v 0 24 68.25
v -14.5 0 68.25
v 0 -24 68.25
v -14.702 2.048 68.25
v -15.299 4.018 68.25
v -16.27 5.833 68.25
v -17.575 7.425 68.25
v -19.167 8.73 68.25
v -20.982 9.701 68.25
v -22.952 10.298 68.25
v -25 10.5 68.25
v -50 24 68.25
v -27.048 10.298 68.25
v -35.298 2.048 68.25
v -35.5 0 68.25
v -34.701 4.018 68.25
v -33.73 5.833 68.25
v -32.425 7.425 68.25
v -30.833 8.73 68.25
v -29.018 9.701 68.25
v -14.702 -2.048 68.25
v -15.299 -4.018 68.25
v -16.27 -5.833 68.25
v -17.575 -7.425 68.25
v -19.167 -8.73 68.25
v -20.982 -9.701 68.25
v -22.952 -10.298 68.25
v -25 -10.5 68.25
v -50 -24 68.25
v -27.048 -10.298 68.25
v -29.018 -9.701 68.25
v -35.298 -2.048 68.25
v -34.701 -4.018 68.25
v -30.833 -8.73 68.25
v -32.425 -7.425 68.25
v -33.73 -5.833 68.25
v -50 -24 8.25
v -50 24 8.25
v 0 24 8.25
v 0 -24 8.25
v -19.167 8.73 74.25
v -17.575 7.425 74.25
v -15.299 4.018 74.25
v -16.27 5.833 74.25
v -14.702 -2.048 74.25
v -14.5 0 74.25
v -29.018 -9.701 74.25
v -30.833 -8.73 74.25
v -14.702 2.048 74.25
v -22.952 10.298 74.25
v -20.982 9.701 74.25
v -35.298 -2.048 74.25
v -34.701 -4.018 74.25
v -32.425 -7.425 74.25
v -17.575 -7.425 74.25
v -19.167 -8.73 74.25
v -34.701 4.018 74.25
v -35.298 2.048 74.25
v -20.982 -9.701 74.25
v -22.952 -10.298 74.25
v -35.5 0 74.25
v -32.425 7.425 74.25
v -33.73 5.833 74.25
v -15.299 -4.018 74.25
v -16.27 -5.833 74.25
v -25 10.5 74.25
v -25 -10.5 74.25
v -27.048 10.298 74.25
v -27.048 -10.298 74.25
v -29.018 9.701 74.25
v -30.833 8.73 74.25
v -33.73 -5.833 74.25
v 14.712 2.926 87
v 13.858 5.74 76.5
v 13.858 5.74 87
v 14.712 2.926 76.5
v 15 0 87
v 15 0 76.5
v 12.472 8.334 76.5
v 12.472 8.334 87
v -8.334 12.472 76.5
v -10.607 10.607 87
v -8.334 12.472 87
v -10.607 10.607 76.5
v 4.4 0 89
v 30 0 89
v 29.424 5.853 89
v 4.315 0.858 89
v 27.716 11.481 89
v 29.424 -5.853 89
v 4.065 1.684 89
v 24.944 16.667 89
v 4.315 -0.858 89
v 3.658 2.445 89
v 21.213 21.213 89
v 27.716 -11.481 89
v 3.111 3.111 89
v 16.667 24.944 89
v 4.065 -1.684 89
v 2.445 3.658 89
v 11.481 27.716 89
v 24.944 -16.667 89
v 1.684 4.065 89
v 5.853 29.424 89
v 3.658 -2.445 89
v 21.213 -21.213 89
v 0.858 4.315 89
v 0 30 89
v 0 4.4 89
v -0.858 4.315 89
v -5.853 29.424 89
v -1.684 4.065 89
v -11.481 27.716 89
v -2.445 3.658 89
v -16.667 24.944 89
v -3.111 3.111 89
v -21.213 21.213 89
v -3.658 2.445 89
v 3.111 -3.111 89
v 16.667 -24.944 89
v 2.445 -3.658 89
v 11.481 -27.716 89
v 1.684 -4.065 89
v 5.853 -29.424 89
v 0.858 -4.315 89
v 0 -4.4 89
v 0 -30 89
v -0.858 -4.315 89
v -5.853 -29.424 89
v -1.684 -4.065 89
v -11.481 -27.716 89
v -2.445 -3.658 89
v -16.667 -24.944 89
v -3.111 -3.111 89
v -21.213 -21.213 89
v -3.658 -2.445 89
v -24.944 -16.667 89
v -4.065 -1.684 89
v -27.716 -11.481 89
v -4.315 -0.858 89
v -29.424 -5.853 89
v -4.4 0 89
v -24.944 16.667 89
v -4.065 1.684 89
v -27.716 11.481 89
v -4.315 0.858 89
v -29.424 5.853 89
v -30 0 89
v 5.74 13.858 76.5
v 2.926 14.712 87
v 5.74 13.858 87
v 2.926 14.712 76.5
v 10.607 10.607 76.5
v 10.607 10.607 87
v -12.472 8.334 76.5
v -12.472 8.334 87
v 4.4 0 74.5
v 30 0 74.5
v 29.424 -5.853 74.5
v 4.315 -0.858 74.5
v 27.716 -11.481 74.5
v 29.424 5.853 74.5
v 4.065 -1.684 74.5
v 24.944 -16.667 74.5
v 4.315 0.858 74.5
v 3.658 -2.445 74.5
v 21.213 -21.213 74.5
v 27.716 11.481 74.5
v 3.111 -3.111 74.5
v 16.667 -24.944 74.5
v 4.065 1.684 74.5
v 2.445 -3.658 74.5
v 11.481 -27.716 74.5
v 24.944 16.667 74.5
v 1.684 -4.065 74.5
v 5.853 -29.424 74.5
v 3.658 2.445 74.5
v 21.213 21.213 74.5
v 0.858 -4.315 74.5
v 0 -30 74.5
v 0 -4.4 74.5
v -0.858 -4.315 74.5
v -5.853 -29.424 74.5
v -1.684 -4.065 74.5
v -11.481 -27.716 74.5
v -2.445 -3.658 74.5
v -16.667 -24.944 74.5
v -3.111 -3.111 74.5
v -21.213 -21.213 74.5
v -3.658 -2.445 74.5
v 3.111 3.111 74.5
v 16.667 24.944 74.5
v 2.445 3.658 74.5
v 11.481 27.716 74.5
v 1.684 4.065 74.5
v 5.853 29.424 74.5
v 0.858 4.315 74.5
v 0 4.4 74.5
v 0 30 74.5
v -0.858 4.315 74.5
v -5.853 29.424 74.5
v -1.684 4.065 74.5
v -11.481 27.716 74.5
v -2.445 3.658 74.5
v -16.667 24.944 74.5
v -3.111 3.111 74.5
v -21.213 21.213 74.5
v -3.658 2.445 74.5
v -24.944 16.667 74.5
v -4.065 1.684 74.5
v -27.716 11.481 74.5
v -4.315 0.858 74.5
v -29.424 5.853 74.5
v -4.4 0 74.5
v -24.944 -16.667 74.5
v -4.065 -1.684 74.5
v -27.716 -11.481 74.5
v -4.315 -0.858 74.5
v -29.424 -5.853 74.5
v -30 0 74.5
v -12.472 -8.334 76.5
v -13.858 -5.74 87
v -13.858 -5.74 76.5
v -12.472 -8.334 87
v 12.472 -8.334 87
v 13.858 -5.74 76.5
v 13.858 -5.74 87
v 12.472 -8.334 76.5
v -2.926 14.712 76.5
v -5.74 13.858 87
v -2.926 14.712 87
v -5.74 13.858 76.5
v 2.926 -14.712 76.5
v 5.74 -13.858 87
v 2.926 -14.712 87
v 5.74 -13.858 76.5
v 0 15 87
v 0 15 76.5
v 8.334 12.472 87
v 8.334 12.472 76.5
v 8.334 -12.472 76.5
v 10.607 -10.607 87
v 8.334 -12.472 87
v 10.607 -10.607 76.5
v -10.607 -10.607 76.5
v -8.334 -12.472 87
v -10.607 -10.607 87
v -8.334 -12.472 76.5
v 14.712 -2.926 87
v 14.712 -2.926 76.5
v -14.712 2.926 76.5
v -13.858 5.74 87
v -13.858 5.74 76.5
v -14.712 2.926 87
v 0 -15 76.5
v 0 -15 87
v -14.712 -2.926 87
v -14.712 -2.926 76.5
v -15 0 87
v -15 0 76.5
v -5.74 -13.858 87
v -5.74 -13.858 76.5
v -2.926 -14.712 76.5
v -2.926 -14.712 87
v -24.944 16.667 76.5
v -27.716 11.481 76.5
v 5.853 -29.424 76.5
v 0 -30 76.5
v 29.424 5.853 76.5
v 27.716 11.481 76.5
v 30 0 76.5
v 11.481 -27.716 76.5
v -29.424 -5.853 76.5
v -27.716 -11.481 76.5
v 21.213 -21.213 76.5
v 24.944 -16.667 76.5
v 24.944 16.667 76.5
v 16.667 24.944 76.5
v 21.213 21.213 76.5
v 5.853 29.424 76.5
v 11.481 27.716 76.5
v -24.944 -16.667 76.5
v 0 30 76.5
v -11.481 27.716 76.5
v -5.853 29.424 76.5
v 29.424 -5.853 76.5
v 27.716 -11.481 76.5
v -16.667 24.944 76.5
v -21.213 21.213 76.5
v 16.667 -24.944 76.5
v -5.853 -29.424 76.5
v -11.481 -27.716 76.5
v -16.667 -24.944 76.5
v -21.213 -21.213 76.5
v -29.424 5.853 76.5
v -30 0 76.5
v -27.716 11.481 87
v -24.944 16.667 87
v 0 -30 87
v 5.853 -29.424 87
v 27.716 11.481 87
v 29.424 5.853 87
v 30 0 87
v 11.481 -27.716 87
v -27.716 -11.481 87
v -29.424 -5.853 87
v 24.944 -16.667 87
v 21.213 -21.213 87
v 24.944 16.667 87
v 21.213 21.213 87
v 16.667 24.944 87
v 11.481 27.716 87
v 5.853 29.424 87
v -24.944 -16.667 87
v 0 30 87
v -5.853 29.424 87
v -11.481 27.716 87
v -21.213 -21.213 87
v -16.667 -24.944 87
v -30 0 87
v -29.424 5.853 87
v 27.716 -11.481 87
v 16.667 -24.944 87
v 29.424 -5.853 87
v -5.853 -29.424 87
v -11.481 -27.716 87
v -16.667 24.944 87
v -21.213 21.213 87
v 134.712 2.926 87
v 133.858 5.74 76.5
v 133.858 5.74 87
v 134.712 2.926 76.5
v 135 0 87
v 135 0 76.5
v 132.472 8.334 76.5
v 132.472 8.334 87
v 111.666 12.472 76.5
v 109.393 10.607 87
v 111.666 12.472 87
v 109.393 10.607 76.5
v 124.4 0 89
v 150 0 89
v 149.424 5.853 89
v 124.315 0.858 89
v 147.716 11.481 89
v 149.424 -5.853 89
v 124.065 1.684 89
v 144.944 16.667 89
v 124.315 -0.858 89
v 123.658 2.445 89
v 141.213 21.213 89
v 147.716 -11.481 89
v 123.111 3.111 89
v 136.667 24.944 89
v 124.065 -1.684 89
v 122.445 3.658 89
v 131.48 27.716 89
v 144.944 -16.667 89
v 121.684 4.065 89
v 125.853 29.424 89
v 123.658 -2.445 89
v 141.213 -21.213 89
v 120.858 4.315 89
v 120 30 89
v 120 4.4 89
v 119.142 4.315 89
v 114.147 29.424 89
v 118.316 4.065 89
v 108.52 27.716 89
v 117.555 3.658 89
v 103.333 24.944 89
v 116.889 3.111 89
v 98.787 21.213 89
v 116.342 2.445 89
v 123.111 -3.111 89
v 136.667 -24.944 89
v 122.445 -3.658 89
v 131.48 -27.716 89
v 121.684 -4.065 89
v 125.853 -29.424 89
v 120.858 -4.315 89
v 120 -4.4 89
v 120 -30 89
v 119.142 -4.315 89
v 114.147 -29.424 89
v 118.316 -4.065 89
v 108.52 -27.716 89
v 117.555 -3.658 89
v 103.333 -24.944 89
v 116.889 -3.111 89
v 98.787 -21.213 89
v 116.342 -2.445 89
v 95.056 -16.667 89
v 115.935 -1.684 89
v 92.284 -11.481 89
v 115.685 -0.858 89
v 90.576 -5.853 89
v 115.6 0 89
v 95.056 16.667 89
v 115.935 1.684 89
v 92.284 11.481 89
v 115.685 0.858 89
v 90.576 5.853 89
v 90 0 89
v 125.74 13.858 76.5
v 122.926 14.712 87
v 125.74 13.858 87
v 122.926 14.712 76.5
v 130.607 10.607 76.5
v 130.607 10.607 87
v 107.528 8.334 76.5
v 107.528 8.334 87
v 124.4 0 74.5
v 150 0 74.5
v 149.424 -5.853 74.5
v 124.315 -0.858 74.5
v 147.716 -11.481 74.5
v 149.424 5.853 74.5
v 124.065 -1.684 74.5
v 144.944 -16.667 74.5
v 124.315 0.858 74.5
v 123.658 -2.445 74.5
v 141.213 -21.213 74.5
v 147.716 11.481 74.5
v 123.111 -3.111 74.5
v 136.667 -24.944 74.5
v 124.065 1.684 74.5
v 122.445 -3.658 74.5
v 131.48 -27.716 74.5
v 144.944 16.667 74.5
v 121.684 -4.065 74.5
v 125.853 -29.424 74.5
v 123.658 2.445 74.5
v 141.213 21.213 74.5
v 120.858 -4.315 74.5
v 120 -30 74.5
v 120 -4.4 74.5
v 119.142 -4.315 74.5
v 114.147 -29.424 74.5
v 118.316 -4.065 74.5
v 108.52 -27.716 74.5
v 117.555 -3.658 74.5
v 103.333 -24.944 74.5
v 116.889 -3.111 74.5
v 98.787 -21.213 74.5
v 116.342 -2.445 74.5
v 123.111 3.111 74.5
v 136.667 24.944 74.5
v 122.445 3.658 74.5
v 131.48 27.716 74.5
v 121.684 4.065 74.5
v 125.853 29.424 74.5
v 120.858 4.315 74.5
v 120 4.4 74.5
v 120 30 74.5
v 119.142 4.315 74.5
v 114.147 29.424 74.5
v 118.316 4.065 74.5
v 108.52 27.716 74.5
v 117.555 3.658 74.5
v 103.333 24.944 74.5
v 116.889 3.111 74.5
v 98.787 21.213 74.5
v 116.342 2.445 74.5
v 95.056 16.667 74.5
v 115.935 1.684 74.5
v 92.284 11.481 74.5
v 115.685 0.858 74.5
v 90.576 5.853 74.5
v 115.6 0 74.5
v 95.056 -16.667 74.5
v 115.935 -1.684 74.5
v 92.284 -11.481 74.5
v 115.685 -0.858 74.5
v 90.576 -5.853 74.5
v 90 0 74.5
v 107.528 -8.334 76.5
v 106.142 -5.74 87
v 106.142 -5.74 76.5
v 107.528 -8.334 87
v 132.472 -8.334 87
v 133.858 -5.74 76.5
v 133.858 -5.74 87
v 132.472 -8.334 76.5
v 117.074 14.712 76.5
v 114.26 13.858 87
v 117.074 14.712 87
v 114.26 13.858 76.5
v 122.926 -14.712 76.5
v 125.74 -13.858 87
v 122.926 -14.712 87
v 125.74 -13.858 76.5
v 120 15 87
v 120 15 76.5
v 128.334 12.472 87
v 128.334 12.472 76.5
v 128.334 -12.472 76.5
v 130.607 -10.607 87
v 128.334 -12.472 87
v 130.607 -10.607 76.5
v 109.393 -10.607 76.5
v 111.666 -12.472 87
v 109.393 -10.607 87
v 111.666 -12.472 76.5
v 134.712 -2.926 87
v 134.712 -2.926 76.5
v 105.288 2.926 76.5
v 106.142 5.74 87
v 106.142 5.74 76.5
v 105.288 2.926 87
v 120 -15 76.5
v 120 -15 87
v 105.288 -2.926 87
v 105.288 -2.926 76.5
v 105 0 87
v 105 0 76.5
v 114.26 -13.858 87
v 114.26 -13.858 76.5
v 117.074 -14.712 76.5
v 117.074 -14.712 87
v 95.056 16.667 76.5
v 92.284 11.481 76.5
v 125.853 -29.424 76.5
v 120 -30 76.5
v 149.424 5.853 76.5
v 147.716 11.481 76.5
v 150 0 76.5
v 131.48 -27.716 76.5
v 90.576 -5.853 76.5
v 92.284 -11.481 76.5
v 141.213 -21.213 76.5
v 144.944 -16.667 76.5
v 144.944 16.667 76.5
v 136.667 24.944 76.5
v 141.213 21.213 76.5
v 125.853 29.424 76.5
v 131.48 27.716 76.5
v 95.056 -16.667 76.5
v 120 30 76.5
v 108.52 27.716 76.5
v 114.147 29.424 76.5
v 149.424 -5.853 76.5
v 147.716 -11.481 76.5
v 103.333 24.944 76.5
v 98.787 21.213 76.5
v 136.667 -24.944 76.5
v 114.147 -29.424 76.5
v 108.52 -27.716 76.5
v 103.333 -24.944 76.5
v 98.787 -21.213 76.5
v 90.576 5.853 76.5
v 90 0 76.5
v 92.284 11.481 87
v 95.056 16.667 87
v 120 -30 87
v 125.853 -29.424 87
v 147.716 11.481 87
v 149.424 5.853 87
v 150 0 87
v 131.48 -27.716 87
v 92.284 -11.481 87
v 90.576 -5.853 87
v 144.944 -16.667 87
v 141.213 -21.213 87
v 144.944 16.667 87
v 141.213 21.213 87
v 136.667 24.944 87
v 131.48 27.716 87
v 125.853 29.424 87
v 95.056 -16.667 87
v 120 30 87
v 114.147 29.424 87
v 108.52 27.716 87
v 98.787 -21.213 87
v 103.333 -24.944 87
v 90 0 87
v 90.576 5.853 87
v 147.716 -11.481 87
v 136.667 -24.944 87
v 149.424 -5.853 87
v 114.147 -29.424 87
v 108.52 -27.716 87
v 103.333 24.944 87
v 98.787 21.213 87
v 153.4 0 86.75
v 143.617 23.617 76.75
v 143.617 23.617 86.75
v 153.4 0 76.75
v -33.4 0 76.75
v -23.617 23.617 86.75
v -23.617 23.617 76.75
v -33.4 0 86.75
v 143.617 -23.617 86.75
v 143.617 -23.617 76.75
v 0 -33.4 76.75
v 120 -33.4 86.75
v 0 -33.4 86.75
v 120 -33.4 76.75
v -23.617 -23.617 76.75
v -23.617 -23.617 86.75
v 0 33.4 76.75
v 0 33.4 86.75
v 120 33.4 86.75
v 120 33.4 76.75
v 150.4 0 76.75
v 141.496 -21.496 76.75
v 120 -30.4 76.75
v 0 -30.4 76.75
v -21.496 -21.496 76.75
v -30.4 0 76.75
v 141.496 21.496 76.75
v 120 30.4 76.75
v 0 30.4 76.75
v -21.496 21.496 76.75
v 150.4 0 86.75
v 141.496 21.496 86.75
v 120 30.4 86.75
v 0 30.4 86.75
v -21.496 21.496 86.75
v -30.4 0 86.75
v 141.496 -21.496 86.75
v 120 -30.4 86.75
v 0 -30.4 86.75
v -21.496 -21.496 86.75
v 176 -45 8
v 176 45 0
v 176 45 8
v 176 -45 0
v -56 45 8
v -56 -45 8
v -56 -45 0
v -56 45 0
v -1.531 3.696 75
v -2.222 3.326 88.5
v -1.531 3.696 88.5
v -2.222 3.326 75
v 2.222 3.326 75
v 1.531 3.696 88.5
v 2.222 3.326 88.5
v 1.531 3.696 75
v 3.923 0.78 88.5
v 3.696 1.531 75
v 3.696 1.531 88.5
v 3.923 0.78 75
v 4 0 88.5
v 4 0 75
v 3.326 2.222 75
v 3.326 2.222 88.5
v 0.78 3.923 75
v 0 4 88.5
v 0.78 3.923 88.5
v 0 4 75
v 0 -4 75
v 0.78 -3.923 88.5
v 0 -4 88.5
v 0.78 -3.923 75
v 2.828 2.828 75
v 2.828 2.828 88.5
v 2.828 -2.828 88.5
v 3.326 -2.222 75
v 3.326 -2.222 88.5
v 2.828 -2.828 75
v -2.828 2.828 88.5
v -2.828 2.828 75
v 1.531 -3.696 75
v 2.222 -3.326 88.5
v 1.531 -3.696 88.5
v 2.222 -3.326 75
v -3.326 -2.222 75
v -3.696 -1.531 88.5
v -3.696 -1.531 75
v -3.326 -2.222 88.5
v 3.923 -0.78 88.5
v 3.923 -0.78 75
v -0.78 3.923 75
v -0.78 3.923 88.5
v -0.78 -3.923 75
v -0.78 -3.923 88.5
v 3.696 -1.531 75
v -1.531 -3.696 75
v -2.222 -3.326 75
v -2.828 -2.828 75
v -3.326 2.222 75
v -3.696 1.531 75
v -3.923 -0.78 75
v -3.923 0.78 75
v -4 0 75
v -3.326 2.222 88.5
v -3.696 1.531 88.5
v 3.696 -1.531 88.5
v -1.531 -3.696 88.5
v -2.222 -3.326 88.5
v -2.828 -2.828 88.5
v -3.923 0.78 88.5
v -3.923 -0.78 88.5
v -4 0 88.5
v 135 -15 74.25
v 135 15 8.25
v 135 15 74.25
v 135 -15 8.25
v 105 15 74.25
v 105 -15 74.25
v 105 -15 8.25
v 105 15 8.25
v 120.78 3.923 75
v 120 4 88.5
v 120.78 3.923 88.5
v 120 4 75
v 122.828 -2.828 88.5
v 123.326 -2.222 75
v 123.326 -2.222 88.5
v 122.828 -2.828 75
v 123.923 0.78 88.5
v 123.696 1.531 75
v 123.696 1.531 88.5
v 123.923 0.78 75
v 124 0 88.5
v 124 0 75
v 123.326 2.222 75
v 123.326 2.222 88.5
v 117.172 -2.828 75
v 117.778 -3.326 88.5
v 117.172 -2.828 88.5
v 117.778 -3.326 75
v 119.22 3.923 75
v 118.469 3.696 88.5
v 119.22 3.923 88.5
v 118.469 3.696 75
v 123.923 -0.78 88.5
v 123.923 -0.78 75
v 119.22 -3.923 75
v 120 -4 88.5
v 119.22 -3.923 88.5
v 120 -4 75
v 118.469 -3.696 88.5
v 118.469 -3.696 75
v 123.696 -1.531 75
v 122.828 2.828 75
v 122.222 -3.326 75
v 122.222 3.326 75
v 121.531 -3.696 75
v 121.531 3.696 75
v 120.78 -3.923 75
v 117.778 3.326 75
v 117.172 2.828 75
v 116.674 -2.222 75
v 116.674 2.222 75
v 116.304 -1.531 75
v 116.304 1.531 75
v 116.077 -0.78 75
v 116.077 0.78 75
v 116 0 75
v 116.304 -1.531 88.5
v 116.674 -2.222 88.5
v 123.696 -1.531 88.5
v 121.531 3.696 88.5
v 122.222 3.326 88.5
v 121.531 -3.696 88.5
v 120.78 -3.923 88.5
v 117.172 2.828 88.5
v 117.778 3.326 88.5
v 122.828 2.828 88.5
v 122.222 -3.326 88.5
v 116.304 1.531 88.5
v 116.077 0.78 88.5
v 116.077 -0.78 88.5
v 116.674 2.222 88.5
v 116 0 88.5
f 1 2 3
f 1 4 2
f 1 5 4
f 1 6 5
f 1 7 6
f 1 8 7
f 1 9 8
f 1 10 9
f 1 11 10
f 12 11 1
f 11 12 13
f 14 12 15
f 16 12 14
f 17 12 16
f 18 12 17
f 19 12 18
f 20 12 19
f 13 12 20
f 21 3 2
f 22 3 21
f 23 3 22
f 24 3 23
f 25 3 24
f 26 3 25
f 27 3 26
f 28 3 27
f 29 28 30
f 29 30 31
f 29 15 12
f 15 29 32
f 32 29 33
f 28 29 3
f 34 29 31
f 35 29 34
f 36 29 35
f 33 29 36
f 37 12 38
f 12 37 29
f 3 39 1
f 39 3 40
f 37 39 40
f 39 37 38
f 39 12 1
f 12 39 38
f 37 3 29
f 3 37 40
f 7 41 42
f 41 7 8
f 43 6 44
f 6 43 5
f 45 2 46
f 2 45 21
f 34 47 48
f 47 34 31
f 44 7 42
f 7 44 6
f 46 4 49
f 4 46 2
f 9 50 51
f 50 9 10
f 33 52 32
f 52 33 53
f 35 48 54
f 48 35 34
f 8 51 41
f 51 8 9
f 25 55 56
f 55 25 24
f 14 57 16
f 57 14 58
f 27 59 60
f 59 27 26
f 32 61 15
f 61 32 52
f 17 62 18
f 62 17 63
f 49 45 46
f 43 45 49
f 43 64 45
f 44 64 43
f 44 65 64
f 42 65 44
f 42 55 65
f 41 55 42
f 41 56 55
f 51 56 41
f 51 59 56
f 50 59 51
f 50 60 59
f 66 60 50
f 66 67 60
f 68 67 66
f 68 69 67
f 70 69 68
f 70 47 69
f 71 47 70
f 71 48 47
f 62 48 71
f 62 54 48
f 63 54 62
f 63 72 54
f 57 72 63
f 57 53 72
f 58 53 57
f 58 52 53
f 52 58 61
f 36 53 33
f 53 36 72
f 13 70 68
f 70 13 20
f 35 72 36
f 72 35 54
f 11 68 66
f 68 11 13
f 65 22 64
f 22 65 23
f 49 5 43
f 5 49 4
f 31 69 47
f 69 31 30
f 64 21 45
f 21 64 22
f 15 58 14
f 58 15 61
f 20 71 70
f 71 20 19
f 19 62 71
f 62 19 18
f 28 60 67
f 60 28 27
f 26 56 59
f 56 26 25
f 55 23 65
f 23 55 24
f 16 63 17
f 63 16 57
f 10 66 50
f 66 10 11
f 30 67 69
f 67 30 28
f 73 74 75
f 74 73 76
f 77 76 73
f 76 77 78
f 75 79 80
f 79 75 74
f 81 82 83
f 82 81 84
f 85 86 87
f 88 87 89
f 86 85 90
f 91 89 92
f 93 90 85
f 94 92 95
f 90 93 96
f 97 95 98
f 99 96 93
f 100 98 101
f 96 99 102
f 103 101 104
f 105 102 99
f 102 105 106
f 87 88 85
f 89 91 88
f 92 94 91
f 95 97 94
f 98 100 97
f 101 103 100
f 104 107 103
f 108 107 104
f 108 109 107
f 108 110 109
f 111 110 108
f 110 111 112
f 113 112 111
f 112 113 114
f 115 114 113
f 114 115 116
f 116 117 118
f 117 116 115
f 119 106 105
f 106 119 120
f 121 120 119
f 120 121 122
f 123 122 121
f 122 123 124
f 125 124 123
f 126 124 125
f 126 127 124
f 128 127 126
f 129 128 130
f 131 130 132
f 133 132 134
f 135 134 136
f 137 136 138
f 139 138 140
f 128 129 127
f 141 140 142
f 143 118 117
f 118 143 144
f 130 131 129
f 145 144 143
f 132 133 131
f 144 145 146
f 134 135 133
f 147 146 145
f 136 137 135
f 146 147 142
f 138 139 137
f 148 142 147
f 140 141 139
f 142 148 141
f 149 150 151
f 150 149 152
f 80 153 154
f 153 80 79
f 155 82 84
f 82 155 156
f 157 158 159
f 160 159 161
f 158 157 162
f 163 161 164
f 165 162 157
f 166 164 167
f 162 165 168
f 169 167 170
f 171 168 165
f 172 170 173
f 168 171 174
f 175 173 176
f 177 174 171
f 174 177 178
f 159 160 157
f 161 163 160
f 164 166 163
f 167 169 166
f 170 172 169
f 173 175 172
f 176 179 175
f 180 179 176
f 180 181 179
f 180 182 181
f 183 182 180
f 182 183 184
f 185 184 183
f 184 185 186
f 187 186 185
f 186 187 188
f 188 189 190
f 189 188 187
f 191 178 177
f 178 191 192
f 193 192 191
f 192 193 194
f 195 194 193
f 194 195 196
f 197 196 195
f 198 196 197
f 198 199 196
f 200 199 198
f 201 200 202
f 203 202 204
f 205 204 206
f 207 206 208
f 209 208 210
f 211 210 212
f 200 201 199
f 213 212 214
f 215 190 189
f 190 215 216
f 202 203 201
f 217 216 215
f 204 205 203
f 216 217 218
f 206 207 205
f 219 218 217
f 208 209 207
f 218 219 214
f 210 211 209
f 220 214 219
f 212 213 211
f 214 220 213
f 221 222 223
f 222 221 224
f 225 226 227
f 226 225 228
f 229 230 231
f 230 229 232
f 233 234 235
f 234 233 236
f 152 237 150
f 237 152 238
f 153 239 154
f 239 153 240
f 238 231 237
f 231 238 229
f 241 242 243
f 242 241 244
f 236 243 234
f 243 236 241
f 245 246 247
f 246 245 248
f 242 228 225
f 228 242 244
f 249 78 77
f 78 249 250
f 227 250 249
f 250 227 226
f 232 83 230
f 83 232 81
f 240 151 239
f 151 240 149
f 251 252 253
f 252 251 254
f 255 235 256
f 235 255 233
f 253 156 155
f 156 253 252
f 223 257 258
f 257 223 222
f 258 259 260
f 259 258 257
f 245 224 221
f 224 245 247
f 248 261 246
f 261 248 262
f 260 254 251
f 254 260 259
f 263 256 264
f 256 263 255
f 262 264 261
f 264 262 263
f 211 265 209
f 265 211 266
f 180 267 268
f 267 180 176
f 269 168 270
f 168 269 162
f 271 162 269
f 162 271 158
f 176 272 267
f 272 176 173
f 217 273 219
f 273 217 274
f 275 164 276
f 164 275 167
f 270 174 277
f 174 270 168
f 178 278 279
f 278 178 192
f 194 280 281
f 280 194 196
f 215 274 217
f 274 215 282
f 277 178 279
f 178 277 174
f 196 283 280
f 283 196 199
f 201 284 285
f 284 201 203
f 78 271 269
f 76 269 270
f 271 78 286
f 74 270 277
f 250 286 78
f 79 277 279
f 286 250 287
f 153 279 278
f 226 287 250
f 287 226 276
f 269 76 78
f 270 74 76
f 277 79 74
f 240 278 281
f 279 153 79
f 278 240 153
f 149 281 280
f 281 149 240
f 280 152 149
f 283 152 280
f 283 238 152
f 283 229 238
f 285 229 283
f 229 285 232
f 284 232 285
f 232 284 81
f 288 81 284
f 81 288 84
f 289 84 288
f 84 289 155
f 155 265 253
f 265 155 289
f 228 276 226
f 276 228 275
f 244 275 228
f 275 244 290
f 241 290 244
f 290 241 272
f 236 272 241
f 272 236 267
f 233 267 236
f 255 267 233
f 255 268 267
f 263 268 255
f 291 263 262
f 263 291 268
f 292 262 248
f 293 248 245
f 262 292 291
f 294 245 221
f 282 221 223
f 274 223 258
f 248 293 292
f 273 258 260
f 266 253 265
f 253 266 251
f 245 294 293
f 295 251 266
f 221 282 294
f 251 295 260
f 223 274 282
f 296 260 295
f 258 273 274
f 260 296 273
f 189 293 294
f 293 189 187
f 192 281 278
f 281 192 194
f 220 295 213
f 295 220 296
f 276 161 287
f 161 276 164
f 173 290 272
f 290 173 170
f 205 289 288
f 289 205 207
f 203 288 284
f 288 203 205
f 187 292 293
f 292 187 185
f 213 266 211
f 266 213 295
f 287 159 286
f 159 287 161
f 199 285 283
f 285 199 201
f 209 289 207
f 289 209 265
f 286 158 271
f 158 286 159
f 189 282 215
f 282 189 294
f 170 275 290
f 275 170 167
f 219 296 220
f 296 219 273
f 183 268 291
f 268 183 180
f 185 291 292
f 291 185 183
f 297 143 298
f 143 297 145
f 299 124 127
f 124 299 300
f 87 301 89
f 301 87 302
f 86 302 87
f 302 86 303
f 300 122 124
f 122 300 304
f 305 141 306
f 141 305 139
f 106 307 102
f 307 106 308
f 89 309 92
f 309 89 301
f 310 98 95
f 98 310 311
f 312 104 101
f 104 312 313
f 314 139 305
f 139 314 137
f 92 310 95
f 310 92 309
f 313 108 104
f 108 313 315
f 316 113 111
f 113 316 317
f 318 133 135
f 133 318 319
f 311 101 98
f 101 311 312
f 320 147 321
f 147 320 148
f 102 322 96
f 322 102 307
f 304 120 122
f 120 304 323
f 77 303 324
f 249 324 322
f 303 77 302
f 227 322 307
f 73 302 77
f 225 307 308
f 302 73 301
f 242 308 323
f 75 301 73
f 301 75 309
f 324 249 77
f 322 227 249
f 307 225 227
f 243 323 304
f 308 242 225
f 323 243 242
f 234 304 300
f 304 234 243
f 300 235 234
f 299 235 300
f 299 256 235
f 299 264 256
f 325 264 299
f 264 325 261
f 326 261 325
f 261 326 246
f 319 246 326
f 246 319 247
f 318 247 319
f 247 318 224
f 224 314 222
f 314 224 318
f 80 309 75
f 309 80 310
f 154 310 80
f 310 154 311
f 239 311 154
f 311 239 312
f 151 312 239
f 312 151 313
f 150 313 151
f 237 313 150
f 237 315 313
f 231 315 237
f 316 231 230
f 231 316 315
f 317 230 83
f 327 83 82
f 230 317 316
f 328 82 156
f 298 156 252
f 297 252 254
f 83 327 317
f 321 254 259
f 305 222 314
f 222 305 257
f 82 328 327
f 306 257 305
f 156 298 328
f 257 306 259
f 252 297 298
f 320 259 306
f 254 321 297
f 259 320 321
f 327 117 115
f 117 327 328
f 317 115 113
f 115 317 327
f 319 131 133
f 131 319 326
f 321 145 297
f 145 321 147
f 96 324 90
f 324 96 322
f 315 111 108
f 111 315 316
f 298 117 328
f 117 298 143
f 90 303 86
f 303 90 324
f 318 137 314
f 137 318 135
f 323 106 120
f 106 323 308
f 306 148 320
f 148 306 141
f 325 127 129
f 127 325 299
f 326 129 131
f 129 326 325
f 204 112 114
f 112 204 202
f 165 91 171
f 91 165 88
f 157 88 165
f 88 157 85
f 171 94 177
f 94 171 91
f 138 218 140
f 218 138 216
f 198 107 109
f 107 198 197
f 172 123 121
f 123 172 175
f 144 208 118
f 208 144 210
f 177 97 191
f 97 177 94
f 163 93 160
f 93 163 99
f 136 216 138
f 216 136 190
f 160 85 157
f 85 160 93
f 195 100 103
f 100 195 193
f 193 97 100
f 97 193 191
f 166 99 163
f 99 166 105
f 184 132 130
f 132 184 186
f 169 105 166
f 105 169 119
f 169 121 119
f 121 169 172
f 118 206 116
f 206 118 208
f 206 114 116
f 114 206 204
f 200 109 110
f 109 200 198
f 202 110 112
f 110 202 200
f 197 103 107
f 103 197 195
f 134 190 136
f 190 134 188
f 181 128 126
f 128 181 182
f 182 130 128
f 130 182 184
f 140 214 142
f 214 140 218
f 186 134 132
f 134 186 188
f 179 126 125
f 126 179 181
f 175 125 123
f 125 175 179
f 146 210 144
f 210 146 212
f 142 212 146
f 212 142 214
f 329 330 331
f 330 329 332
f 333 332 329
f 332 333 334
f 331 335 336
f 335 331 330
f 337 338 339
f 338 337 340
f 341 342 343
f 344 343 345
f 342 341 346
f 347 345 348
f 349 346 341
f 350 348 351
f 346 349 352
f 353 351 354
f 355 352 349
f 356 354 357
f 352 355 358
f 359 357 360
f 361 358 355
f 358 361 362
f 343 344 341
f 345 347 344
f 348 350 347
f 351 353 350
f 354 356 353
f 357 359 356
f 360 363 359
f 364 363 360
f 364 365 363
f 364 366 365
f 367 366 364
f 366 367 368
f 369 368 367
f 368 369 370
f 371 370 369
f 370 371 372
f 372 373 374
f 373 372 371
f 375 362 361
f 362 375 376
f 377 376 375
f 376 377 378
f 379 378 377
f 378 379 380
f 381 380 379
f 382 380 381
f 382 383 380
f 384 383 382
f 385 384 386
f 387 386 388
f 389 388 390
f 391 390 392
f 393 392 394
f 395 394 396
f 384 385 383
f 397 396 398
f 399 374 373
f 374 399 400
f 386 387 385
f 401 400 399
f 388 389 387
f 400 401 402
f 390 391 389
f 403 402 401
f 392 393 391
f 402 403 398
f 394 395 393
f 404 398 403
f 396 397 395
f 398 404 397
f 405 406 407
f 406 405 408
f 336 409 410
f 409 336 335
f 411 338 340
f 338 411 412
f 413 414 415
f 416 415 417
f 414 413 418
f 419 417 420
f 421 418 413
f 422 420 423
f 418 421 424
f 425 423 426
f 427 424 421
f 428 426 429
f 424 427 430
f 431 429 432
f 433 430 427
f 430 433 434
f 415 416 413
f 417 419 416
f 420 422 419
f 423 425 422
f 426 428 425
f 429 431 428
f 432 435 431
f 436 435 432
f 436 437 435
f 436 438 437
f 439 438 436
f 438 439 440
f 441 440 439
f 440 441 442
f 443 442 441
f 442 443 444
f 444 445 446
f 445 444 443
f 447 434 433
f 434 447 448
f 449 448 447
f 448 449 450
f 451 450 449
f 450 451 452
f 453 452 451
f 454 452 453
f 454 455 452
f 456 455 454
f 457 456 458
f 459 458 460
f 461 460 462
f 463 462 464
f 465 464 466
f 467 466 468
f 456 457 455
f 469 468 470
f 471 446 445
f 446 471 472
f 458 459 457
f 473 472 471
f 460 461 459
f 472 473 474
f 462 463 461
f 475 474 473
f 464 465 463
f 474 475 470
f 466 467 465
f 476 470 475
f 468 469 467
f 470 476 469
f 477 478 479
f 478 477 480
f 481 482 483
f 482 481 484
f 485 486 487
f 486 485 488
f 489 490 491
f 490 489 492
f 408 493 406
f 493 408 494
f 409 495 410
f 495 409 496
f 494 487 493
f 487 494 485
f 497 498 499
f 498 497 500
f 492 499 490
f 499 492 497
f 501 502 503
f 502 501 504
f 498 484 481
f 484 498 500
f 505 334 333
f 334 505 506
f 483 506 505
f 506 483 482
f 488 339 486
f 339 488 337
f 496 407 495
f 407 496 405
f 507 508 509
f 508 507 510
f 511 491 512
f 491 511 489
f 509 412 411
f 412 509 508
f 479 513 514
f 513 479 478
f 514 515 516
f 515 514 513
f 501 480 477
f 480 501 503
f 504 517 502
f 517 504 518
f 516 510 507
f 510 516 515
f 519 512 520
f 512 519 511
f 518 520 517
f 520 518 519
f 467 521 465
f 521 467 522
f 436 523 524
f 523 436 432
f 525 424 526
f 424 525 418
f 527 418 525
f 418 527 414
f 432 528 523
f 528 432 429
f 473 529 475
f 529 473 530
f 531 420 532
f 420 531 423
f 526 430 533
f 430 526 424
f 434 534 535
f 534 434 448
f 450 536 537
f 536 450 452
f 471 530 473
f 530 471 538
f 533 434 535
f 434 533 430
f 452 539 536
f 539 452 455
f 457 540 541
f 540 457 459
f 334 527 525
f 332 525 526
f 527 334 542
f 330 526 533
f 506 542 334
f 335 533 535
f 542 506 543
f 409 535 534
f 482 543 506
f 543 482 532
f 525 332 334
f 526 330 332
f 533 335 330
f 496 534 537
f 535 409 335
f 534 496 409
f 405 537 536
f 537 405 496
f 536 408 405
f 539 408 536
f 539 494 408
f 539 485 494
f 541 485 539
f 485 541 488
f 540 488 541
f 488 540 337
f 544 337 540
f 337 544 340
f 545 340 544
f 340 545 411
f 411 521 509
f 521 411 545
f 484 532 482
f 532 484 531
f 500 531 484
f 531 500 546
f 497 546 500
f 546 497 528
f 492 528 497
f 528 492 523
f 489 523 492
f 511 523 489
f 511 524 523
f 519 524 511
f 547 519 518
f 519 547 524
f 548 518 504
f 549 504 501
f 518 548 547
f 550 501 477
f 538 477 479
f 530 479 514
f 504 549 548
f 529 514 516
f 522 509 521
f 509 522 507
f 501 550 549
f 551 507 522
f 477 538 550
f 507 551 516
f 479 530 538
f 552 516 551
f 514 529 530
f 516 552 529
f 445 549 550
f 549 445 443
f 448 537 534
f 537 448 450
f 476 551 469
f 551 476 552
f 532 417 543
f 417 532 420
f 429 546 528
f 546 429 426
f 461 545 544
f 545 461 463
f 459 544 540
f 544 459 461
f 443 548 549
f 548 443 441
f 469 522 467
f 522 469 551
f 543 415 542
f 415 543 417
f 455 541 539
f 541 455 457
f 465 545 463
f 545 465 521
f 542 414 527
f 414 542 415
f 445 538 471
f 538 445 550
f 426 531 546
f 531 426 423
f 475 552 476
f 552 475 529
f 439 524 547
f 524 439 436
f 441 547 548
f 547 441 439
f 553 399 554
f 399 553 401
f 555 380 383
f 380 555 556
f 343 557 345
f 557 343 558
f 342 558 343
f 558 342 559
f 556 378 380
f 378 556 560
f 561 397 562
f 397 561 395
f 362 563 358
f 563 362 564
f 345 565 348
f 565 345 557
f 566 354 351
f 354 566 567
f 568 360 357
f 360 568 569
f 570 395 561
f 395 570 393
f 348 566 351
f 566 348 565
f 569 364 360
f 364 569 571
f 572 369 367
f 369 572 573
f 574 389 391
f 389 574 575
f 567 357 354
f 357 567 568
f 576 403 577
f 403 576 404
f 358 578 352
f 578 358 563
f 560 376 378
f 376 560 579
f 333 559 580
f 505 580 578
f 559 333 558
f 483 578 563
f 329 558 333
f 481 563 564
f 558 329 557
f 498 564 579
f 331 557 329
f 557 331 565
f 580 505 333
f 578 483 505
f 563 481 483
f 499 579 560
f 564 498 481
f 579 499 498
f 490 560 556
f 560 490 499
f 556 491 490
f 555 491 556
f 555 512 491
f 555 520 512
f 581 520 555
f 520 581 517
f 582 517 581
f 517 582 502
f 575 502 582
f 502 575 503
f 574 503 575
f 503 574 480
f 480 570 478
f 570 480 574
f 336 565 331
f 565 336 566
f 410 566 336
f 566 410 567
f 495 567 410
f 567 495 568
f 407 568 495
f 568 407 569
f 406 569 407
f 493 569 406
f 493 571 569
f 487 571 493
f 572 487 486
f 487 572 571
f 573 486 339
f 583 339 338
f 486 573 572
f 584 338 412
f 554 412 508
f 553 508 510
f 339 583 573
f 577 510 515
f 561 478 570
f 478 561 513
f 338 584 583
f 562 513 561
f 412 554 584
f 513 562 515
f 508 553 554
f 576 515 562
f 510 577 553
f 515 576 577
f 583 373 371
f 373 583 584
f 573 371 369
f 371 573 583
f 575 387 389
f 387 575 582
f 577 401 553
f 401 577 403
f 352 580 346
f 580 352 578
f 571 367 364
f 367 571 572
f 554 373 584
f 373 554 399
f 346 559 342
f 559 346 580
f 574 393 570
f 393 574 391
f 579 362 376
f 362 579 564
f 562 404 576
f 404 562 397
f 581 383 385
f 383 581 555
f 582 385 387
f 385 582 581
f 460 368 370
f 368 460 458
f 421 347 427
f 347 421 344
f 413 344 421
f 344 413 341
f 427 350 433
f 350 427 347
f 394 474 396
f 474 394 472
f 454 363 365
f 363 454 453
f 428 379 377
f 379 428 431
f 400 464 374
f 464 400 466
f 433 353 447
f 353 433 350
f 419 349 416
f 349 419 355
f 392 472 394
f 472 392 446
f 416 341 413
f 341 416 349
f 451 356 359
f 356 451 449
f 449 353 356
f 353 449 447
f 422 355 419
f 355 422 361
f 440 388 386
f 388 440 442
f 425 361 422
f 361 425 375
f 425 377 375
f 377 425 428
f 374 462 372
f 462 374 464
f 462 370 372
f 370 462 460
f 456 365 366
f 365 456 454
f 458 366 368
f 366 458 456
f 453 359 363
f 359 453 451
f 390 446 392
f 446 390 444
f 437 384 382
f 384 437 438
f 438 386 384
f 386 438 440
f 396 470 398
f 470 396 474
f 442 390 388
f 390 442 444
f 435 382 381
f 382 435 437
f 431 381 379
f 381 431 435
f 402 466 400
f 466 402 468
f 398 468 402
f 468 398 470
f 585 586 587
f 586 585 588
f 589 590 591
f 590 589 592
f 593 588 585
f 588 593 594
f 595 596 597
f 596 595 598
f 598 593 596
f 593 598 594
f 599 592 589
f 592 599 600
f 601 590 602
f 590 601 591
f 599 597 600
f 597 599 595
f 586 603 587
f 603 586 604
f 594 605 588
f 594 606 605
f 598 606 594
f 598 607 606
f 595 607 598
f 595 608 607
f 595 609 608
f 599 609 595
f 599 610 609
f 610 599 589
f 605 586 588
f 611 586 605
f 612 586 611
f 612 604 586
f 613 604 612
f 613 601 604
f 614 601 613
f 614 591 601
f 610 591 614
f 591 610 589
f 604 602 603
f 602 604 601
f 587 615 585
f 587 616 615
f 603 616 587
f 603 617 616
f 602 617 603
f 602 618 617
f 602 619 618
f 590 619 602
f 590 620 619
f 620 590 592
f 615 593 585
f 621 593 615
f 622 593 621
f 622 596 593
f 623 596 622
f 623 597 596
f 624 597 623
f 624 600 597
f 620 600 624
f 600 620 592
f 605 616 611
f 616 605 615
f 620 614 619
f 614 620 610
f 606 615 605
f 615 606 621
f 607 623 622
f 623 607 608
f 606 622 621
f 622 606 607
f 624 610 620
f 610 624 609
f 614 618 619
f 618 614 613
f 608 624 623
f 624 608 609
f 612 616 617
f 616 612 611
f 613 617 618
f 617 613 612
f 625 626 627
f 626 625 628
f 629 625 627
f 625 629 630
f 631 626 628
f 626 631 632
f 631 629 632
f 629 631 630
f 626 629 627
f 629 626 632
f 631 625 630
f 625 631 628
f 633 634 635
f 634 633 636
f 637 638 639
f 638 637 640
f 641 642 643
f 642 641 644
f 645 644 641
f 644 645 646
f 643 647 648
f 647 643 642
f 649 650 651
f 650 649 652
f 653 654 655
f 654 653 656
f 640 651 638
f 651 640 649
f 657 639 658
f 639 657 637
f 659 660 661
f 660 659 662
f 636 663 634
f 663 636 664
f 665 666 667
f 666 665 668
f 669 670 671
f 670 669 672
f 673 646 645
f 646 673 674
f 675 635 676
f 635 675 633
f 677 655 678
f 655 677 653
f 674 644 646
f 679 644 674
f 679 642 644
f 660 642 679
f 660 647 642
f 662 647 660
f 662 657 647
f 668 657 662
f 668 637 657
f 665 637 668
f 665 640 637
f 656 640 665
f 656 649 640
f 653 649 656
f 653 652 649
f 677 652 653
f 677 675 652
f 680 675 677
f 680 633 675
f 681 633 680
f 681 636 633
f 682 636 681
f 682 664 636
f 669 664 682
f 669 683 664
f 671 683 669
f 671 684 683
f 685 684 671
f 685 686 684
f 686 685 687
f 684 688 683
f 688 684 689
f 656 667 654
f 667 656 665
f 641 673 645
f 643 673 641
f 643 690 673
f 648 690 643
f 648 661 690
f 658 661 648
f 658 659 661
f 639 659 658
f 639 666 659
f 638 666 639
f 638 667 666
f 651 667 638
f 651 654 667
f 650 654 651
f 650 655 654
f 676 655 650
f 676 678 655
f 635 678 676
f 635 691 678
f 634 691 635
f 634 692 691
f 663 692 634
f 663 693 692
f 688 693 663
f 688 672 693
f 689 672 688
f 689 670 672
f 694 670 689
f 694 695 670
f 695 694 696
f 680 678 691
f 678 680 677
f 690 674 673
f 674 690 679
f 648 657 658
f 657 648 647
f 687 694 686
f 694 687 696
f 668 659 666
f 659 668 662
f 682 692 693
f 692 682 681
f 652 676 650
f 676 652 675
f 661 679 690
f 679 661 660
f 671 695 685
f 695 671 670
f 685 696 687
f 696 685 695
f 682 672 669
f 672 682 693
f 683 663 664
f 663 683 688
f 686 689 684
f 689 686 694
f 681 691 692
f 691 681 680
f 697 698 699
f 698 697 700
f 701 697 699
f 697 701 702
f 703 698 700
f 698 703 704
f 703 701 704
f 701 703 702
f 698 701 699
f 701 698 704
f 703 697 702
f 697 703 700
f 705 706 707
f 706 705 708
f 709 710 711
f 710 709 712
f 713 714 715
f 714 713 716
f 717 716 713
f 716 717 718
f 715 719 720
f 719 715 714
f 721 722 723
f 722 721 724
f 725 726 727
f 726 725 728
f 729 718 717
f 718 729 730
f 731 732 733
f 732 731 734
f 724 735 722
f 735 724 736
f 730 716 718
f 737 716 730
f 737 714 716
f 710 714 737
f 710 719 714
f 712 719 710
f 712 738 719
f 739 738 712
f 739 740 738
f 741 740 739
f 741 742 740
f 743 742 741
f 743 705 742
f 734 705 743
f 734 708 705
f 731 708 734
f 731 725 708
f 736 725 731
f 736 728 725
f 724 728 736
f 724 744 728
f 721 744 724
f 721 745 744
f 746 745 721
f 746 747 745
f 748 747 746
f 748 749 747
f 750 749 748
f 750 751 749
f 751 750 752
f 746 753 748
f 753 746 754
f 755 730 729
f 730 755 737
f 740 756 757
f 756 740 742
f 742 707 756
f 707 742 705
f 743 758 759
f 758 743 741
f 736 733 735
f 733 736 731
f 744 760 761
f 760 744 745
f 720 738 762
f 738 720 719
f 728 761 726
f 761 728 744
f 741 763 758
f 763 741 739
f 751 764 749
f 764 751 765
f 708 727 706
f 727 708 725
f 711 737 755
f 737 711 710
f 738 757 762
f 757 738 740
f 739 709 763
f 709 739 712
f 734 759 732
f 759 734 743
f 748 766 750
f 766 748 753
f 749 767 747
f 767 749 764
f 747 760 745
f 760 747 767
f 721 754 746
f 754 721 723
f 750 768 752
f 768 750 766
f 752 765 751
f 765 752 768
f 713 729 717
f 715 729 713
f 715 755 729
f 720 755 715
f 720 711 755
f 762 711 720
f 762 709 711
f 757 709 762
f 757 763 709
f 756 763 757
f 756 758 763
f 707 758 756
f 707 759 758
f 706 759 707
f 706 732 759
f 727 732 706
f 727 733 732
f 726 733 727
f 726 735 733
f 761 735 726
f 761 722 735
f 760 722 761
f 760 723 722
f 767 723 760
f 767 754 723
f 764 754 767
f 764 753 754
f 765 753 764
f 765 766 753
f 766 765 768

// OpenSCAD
$fn = 32;

// ------------------------------------------------------------------------
// Motor belt drive: span 120 mm, pulleys d60, belt 10 mm wide
// Every part is its own module, assembly() places every instance.
// ------------------------------------------------------------------------

// --- part 1 ---
module base_plate() {
  difference() {
    translate([-116, -45, 0]) cube([232, 90, 8]);
  }
}

// --- part 2 ---
module motor() {
  union() {
    translate([-30, -24, 0]) cube([60, 48, 50]);
    translate([33, 0, 25]) rotate([0, 90, 0]) cylinder(h = 6, d = 21, center = true);
  }
}

// --- part 3 ---
module drive_shaft() {
  translate([0, 0, -6.75]) cylinder(h = 13.5, d = 8);
}

// --- part 4 ---
module pulley_drive() {
  difference() {
    union() {
      cylinder(h = 14.5, d = 30);
      cylinder(h = 2, d = 60);
      translate([0, 0, 12.5]) cylinder(h = 2, d = 60);
    }
    translate([0, 0, -1]) cylinder(h = 16.5, d = 8.8);
  }
}

// --- part 5 ---
module idler_post() {
  translate([-15, -15, 0]) cube([30, 30, 66]);
}

// --- part 6 ---
module driven_shaft() {
  translate([0, 0, -6.75]) cylinder(h = 13.5, d = 8);
}

// --- part 7 ---
module pulley_driven() {
  difference() {
    union() {
      cylinder(h = 14.5, d = 30);
      cylinder(h = 2, d = 60);
      translate([0, 0, 12.5]) cylinder(h = 2, d = 60);
    }
    translate([0, 0, -1]) cylinder(h = 16.5, d = 8.8);
  }
}

// --- part 8 ---
module drive_belt() {
  difference() {
    linear_extrude(height = 10) polygon(points = concat([for (a = [90 : 45 : 270]) [33.4 * cos(a), 33.4 * sin(a)]], [for (a = [270 : 45 : 450]) [120 + 33.4 * cos(a), 33.4 * sin(a)]]));
    translate([0, 0, -1]) linear_extrude(height = 12) polygon(points = concat([for (a = [90 : 45 : 270]) [30.4 * cos(a), 30.4 * sin(a)]], [for (a = [270 : 45 : 450]) [120 + 30.4 * cos(a), 30.4 * sin(a)]]));
  }
}

// --- assembly ---
module assembly() {
  color([0.80, 0.24, 0.20]) translate([60, 0, 0]) rotate([0, 0, 0]) base_plate();
  color([0.20, 0.45, 0.75]) translate([0, 0, 38.25]) rotate([0, 270, 0]) motor();
  color([0.25, 0.62, 0.32]) translate([0, 0, 81.75]) rotate([0, 0, 0]) drive_shaft();
  color([0.92, 0.70, 0.18]) translate([0, 0, 74.5]) rotate([0, 0, 0]) pulley_drive();
  color([0.58, 0.35, 0.70]) translate([120, 0, 8.25]) rotate([0, 0, 0]) idler_post();
  color([0.16, 0.66, 0.66]) translate([120, 0, 81.75]) rotate([0, 0, 0]) driven_shaft();
  color([0.85, 0.48, 0.18]) translate([120, 0, 74.5]) rotate([0, 0, 0]) pulley_driven();
  color([0.55, 0.60, 0.65]) translate([0, 0, 76.75]) rotate([0, 0, 0]) drive_belt();
}

assembly();
